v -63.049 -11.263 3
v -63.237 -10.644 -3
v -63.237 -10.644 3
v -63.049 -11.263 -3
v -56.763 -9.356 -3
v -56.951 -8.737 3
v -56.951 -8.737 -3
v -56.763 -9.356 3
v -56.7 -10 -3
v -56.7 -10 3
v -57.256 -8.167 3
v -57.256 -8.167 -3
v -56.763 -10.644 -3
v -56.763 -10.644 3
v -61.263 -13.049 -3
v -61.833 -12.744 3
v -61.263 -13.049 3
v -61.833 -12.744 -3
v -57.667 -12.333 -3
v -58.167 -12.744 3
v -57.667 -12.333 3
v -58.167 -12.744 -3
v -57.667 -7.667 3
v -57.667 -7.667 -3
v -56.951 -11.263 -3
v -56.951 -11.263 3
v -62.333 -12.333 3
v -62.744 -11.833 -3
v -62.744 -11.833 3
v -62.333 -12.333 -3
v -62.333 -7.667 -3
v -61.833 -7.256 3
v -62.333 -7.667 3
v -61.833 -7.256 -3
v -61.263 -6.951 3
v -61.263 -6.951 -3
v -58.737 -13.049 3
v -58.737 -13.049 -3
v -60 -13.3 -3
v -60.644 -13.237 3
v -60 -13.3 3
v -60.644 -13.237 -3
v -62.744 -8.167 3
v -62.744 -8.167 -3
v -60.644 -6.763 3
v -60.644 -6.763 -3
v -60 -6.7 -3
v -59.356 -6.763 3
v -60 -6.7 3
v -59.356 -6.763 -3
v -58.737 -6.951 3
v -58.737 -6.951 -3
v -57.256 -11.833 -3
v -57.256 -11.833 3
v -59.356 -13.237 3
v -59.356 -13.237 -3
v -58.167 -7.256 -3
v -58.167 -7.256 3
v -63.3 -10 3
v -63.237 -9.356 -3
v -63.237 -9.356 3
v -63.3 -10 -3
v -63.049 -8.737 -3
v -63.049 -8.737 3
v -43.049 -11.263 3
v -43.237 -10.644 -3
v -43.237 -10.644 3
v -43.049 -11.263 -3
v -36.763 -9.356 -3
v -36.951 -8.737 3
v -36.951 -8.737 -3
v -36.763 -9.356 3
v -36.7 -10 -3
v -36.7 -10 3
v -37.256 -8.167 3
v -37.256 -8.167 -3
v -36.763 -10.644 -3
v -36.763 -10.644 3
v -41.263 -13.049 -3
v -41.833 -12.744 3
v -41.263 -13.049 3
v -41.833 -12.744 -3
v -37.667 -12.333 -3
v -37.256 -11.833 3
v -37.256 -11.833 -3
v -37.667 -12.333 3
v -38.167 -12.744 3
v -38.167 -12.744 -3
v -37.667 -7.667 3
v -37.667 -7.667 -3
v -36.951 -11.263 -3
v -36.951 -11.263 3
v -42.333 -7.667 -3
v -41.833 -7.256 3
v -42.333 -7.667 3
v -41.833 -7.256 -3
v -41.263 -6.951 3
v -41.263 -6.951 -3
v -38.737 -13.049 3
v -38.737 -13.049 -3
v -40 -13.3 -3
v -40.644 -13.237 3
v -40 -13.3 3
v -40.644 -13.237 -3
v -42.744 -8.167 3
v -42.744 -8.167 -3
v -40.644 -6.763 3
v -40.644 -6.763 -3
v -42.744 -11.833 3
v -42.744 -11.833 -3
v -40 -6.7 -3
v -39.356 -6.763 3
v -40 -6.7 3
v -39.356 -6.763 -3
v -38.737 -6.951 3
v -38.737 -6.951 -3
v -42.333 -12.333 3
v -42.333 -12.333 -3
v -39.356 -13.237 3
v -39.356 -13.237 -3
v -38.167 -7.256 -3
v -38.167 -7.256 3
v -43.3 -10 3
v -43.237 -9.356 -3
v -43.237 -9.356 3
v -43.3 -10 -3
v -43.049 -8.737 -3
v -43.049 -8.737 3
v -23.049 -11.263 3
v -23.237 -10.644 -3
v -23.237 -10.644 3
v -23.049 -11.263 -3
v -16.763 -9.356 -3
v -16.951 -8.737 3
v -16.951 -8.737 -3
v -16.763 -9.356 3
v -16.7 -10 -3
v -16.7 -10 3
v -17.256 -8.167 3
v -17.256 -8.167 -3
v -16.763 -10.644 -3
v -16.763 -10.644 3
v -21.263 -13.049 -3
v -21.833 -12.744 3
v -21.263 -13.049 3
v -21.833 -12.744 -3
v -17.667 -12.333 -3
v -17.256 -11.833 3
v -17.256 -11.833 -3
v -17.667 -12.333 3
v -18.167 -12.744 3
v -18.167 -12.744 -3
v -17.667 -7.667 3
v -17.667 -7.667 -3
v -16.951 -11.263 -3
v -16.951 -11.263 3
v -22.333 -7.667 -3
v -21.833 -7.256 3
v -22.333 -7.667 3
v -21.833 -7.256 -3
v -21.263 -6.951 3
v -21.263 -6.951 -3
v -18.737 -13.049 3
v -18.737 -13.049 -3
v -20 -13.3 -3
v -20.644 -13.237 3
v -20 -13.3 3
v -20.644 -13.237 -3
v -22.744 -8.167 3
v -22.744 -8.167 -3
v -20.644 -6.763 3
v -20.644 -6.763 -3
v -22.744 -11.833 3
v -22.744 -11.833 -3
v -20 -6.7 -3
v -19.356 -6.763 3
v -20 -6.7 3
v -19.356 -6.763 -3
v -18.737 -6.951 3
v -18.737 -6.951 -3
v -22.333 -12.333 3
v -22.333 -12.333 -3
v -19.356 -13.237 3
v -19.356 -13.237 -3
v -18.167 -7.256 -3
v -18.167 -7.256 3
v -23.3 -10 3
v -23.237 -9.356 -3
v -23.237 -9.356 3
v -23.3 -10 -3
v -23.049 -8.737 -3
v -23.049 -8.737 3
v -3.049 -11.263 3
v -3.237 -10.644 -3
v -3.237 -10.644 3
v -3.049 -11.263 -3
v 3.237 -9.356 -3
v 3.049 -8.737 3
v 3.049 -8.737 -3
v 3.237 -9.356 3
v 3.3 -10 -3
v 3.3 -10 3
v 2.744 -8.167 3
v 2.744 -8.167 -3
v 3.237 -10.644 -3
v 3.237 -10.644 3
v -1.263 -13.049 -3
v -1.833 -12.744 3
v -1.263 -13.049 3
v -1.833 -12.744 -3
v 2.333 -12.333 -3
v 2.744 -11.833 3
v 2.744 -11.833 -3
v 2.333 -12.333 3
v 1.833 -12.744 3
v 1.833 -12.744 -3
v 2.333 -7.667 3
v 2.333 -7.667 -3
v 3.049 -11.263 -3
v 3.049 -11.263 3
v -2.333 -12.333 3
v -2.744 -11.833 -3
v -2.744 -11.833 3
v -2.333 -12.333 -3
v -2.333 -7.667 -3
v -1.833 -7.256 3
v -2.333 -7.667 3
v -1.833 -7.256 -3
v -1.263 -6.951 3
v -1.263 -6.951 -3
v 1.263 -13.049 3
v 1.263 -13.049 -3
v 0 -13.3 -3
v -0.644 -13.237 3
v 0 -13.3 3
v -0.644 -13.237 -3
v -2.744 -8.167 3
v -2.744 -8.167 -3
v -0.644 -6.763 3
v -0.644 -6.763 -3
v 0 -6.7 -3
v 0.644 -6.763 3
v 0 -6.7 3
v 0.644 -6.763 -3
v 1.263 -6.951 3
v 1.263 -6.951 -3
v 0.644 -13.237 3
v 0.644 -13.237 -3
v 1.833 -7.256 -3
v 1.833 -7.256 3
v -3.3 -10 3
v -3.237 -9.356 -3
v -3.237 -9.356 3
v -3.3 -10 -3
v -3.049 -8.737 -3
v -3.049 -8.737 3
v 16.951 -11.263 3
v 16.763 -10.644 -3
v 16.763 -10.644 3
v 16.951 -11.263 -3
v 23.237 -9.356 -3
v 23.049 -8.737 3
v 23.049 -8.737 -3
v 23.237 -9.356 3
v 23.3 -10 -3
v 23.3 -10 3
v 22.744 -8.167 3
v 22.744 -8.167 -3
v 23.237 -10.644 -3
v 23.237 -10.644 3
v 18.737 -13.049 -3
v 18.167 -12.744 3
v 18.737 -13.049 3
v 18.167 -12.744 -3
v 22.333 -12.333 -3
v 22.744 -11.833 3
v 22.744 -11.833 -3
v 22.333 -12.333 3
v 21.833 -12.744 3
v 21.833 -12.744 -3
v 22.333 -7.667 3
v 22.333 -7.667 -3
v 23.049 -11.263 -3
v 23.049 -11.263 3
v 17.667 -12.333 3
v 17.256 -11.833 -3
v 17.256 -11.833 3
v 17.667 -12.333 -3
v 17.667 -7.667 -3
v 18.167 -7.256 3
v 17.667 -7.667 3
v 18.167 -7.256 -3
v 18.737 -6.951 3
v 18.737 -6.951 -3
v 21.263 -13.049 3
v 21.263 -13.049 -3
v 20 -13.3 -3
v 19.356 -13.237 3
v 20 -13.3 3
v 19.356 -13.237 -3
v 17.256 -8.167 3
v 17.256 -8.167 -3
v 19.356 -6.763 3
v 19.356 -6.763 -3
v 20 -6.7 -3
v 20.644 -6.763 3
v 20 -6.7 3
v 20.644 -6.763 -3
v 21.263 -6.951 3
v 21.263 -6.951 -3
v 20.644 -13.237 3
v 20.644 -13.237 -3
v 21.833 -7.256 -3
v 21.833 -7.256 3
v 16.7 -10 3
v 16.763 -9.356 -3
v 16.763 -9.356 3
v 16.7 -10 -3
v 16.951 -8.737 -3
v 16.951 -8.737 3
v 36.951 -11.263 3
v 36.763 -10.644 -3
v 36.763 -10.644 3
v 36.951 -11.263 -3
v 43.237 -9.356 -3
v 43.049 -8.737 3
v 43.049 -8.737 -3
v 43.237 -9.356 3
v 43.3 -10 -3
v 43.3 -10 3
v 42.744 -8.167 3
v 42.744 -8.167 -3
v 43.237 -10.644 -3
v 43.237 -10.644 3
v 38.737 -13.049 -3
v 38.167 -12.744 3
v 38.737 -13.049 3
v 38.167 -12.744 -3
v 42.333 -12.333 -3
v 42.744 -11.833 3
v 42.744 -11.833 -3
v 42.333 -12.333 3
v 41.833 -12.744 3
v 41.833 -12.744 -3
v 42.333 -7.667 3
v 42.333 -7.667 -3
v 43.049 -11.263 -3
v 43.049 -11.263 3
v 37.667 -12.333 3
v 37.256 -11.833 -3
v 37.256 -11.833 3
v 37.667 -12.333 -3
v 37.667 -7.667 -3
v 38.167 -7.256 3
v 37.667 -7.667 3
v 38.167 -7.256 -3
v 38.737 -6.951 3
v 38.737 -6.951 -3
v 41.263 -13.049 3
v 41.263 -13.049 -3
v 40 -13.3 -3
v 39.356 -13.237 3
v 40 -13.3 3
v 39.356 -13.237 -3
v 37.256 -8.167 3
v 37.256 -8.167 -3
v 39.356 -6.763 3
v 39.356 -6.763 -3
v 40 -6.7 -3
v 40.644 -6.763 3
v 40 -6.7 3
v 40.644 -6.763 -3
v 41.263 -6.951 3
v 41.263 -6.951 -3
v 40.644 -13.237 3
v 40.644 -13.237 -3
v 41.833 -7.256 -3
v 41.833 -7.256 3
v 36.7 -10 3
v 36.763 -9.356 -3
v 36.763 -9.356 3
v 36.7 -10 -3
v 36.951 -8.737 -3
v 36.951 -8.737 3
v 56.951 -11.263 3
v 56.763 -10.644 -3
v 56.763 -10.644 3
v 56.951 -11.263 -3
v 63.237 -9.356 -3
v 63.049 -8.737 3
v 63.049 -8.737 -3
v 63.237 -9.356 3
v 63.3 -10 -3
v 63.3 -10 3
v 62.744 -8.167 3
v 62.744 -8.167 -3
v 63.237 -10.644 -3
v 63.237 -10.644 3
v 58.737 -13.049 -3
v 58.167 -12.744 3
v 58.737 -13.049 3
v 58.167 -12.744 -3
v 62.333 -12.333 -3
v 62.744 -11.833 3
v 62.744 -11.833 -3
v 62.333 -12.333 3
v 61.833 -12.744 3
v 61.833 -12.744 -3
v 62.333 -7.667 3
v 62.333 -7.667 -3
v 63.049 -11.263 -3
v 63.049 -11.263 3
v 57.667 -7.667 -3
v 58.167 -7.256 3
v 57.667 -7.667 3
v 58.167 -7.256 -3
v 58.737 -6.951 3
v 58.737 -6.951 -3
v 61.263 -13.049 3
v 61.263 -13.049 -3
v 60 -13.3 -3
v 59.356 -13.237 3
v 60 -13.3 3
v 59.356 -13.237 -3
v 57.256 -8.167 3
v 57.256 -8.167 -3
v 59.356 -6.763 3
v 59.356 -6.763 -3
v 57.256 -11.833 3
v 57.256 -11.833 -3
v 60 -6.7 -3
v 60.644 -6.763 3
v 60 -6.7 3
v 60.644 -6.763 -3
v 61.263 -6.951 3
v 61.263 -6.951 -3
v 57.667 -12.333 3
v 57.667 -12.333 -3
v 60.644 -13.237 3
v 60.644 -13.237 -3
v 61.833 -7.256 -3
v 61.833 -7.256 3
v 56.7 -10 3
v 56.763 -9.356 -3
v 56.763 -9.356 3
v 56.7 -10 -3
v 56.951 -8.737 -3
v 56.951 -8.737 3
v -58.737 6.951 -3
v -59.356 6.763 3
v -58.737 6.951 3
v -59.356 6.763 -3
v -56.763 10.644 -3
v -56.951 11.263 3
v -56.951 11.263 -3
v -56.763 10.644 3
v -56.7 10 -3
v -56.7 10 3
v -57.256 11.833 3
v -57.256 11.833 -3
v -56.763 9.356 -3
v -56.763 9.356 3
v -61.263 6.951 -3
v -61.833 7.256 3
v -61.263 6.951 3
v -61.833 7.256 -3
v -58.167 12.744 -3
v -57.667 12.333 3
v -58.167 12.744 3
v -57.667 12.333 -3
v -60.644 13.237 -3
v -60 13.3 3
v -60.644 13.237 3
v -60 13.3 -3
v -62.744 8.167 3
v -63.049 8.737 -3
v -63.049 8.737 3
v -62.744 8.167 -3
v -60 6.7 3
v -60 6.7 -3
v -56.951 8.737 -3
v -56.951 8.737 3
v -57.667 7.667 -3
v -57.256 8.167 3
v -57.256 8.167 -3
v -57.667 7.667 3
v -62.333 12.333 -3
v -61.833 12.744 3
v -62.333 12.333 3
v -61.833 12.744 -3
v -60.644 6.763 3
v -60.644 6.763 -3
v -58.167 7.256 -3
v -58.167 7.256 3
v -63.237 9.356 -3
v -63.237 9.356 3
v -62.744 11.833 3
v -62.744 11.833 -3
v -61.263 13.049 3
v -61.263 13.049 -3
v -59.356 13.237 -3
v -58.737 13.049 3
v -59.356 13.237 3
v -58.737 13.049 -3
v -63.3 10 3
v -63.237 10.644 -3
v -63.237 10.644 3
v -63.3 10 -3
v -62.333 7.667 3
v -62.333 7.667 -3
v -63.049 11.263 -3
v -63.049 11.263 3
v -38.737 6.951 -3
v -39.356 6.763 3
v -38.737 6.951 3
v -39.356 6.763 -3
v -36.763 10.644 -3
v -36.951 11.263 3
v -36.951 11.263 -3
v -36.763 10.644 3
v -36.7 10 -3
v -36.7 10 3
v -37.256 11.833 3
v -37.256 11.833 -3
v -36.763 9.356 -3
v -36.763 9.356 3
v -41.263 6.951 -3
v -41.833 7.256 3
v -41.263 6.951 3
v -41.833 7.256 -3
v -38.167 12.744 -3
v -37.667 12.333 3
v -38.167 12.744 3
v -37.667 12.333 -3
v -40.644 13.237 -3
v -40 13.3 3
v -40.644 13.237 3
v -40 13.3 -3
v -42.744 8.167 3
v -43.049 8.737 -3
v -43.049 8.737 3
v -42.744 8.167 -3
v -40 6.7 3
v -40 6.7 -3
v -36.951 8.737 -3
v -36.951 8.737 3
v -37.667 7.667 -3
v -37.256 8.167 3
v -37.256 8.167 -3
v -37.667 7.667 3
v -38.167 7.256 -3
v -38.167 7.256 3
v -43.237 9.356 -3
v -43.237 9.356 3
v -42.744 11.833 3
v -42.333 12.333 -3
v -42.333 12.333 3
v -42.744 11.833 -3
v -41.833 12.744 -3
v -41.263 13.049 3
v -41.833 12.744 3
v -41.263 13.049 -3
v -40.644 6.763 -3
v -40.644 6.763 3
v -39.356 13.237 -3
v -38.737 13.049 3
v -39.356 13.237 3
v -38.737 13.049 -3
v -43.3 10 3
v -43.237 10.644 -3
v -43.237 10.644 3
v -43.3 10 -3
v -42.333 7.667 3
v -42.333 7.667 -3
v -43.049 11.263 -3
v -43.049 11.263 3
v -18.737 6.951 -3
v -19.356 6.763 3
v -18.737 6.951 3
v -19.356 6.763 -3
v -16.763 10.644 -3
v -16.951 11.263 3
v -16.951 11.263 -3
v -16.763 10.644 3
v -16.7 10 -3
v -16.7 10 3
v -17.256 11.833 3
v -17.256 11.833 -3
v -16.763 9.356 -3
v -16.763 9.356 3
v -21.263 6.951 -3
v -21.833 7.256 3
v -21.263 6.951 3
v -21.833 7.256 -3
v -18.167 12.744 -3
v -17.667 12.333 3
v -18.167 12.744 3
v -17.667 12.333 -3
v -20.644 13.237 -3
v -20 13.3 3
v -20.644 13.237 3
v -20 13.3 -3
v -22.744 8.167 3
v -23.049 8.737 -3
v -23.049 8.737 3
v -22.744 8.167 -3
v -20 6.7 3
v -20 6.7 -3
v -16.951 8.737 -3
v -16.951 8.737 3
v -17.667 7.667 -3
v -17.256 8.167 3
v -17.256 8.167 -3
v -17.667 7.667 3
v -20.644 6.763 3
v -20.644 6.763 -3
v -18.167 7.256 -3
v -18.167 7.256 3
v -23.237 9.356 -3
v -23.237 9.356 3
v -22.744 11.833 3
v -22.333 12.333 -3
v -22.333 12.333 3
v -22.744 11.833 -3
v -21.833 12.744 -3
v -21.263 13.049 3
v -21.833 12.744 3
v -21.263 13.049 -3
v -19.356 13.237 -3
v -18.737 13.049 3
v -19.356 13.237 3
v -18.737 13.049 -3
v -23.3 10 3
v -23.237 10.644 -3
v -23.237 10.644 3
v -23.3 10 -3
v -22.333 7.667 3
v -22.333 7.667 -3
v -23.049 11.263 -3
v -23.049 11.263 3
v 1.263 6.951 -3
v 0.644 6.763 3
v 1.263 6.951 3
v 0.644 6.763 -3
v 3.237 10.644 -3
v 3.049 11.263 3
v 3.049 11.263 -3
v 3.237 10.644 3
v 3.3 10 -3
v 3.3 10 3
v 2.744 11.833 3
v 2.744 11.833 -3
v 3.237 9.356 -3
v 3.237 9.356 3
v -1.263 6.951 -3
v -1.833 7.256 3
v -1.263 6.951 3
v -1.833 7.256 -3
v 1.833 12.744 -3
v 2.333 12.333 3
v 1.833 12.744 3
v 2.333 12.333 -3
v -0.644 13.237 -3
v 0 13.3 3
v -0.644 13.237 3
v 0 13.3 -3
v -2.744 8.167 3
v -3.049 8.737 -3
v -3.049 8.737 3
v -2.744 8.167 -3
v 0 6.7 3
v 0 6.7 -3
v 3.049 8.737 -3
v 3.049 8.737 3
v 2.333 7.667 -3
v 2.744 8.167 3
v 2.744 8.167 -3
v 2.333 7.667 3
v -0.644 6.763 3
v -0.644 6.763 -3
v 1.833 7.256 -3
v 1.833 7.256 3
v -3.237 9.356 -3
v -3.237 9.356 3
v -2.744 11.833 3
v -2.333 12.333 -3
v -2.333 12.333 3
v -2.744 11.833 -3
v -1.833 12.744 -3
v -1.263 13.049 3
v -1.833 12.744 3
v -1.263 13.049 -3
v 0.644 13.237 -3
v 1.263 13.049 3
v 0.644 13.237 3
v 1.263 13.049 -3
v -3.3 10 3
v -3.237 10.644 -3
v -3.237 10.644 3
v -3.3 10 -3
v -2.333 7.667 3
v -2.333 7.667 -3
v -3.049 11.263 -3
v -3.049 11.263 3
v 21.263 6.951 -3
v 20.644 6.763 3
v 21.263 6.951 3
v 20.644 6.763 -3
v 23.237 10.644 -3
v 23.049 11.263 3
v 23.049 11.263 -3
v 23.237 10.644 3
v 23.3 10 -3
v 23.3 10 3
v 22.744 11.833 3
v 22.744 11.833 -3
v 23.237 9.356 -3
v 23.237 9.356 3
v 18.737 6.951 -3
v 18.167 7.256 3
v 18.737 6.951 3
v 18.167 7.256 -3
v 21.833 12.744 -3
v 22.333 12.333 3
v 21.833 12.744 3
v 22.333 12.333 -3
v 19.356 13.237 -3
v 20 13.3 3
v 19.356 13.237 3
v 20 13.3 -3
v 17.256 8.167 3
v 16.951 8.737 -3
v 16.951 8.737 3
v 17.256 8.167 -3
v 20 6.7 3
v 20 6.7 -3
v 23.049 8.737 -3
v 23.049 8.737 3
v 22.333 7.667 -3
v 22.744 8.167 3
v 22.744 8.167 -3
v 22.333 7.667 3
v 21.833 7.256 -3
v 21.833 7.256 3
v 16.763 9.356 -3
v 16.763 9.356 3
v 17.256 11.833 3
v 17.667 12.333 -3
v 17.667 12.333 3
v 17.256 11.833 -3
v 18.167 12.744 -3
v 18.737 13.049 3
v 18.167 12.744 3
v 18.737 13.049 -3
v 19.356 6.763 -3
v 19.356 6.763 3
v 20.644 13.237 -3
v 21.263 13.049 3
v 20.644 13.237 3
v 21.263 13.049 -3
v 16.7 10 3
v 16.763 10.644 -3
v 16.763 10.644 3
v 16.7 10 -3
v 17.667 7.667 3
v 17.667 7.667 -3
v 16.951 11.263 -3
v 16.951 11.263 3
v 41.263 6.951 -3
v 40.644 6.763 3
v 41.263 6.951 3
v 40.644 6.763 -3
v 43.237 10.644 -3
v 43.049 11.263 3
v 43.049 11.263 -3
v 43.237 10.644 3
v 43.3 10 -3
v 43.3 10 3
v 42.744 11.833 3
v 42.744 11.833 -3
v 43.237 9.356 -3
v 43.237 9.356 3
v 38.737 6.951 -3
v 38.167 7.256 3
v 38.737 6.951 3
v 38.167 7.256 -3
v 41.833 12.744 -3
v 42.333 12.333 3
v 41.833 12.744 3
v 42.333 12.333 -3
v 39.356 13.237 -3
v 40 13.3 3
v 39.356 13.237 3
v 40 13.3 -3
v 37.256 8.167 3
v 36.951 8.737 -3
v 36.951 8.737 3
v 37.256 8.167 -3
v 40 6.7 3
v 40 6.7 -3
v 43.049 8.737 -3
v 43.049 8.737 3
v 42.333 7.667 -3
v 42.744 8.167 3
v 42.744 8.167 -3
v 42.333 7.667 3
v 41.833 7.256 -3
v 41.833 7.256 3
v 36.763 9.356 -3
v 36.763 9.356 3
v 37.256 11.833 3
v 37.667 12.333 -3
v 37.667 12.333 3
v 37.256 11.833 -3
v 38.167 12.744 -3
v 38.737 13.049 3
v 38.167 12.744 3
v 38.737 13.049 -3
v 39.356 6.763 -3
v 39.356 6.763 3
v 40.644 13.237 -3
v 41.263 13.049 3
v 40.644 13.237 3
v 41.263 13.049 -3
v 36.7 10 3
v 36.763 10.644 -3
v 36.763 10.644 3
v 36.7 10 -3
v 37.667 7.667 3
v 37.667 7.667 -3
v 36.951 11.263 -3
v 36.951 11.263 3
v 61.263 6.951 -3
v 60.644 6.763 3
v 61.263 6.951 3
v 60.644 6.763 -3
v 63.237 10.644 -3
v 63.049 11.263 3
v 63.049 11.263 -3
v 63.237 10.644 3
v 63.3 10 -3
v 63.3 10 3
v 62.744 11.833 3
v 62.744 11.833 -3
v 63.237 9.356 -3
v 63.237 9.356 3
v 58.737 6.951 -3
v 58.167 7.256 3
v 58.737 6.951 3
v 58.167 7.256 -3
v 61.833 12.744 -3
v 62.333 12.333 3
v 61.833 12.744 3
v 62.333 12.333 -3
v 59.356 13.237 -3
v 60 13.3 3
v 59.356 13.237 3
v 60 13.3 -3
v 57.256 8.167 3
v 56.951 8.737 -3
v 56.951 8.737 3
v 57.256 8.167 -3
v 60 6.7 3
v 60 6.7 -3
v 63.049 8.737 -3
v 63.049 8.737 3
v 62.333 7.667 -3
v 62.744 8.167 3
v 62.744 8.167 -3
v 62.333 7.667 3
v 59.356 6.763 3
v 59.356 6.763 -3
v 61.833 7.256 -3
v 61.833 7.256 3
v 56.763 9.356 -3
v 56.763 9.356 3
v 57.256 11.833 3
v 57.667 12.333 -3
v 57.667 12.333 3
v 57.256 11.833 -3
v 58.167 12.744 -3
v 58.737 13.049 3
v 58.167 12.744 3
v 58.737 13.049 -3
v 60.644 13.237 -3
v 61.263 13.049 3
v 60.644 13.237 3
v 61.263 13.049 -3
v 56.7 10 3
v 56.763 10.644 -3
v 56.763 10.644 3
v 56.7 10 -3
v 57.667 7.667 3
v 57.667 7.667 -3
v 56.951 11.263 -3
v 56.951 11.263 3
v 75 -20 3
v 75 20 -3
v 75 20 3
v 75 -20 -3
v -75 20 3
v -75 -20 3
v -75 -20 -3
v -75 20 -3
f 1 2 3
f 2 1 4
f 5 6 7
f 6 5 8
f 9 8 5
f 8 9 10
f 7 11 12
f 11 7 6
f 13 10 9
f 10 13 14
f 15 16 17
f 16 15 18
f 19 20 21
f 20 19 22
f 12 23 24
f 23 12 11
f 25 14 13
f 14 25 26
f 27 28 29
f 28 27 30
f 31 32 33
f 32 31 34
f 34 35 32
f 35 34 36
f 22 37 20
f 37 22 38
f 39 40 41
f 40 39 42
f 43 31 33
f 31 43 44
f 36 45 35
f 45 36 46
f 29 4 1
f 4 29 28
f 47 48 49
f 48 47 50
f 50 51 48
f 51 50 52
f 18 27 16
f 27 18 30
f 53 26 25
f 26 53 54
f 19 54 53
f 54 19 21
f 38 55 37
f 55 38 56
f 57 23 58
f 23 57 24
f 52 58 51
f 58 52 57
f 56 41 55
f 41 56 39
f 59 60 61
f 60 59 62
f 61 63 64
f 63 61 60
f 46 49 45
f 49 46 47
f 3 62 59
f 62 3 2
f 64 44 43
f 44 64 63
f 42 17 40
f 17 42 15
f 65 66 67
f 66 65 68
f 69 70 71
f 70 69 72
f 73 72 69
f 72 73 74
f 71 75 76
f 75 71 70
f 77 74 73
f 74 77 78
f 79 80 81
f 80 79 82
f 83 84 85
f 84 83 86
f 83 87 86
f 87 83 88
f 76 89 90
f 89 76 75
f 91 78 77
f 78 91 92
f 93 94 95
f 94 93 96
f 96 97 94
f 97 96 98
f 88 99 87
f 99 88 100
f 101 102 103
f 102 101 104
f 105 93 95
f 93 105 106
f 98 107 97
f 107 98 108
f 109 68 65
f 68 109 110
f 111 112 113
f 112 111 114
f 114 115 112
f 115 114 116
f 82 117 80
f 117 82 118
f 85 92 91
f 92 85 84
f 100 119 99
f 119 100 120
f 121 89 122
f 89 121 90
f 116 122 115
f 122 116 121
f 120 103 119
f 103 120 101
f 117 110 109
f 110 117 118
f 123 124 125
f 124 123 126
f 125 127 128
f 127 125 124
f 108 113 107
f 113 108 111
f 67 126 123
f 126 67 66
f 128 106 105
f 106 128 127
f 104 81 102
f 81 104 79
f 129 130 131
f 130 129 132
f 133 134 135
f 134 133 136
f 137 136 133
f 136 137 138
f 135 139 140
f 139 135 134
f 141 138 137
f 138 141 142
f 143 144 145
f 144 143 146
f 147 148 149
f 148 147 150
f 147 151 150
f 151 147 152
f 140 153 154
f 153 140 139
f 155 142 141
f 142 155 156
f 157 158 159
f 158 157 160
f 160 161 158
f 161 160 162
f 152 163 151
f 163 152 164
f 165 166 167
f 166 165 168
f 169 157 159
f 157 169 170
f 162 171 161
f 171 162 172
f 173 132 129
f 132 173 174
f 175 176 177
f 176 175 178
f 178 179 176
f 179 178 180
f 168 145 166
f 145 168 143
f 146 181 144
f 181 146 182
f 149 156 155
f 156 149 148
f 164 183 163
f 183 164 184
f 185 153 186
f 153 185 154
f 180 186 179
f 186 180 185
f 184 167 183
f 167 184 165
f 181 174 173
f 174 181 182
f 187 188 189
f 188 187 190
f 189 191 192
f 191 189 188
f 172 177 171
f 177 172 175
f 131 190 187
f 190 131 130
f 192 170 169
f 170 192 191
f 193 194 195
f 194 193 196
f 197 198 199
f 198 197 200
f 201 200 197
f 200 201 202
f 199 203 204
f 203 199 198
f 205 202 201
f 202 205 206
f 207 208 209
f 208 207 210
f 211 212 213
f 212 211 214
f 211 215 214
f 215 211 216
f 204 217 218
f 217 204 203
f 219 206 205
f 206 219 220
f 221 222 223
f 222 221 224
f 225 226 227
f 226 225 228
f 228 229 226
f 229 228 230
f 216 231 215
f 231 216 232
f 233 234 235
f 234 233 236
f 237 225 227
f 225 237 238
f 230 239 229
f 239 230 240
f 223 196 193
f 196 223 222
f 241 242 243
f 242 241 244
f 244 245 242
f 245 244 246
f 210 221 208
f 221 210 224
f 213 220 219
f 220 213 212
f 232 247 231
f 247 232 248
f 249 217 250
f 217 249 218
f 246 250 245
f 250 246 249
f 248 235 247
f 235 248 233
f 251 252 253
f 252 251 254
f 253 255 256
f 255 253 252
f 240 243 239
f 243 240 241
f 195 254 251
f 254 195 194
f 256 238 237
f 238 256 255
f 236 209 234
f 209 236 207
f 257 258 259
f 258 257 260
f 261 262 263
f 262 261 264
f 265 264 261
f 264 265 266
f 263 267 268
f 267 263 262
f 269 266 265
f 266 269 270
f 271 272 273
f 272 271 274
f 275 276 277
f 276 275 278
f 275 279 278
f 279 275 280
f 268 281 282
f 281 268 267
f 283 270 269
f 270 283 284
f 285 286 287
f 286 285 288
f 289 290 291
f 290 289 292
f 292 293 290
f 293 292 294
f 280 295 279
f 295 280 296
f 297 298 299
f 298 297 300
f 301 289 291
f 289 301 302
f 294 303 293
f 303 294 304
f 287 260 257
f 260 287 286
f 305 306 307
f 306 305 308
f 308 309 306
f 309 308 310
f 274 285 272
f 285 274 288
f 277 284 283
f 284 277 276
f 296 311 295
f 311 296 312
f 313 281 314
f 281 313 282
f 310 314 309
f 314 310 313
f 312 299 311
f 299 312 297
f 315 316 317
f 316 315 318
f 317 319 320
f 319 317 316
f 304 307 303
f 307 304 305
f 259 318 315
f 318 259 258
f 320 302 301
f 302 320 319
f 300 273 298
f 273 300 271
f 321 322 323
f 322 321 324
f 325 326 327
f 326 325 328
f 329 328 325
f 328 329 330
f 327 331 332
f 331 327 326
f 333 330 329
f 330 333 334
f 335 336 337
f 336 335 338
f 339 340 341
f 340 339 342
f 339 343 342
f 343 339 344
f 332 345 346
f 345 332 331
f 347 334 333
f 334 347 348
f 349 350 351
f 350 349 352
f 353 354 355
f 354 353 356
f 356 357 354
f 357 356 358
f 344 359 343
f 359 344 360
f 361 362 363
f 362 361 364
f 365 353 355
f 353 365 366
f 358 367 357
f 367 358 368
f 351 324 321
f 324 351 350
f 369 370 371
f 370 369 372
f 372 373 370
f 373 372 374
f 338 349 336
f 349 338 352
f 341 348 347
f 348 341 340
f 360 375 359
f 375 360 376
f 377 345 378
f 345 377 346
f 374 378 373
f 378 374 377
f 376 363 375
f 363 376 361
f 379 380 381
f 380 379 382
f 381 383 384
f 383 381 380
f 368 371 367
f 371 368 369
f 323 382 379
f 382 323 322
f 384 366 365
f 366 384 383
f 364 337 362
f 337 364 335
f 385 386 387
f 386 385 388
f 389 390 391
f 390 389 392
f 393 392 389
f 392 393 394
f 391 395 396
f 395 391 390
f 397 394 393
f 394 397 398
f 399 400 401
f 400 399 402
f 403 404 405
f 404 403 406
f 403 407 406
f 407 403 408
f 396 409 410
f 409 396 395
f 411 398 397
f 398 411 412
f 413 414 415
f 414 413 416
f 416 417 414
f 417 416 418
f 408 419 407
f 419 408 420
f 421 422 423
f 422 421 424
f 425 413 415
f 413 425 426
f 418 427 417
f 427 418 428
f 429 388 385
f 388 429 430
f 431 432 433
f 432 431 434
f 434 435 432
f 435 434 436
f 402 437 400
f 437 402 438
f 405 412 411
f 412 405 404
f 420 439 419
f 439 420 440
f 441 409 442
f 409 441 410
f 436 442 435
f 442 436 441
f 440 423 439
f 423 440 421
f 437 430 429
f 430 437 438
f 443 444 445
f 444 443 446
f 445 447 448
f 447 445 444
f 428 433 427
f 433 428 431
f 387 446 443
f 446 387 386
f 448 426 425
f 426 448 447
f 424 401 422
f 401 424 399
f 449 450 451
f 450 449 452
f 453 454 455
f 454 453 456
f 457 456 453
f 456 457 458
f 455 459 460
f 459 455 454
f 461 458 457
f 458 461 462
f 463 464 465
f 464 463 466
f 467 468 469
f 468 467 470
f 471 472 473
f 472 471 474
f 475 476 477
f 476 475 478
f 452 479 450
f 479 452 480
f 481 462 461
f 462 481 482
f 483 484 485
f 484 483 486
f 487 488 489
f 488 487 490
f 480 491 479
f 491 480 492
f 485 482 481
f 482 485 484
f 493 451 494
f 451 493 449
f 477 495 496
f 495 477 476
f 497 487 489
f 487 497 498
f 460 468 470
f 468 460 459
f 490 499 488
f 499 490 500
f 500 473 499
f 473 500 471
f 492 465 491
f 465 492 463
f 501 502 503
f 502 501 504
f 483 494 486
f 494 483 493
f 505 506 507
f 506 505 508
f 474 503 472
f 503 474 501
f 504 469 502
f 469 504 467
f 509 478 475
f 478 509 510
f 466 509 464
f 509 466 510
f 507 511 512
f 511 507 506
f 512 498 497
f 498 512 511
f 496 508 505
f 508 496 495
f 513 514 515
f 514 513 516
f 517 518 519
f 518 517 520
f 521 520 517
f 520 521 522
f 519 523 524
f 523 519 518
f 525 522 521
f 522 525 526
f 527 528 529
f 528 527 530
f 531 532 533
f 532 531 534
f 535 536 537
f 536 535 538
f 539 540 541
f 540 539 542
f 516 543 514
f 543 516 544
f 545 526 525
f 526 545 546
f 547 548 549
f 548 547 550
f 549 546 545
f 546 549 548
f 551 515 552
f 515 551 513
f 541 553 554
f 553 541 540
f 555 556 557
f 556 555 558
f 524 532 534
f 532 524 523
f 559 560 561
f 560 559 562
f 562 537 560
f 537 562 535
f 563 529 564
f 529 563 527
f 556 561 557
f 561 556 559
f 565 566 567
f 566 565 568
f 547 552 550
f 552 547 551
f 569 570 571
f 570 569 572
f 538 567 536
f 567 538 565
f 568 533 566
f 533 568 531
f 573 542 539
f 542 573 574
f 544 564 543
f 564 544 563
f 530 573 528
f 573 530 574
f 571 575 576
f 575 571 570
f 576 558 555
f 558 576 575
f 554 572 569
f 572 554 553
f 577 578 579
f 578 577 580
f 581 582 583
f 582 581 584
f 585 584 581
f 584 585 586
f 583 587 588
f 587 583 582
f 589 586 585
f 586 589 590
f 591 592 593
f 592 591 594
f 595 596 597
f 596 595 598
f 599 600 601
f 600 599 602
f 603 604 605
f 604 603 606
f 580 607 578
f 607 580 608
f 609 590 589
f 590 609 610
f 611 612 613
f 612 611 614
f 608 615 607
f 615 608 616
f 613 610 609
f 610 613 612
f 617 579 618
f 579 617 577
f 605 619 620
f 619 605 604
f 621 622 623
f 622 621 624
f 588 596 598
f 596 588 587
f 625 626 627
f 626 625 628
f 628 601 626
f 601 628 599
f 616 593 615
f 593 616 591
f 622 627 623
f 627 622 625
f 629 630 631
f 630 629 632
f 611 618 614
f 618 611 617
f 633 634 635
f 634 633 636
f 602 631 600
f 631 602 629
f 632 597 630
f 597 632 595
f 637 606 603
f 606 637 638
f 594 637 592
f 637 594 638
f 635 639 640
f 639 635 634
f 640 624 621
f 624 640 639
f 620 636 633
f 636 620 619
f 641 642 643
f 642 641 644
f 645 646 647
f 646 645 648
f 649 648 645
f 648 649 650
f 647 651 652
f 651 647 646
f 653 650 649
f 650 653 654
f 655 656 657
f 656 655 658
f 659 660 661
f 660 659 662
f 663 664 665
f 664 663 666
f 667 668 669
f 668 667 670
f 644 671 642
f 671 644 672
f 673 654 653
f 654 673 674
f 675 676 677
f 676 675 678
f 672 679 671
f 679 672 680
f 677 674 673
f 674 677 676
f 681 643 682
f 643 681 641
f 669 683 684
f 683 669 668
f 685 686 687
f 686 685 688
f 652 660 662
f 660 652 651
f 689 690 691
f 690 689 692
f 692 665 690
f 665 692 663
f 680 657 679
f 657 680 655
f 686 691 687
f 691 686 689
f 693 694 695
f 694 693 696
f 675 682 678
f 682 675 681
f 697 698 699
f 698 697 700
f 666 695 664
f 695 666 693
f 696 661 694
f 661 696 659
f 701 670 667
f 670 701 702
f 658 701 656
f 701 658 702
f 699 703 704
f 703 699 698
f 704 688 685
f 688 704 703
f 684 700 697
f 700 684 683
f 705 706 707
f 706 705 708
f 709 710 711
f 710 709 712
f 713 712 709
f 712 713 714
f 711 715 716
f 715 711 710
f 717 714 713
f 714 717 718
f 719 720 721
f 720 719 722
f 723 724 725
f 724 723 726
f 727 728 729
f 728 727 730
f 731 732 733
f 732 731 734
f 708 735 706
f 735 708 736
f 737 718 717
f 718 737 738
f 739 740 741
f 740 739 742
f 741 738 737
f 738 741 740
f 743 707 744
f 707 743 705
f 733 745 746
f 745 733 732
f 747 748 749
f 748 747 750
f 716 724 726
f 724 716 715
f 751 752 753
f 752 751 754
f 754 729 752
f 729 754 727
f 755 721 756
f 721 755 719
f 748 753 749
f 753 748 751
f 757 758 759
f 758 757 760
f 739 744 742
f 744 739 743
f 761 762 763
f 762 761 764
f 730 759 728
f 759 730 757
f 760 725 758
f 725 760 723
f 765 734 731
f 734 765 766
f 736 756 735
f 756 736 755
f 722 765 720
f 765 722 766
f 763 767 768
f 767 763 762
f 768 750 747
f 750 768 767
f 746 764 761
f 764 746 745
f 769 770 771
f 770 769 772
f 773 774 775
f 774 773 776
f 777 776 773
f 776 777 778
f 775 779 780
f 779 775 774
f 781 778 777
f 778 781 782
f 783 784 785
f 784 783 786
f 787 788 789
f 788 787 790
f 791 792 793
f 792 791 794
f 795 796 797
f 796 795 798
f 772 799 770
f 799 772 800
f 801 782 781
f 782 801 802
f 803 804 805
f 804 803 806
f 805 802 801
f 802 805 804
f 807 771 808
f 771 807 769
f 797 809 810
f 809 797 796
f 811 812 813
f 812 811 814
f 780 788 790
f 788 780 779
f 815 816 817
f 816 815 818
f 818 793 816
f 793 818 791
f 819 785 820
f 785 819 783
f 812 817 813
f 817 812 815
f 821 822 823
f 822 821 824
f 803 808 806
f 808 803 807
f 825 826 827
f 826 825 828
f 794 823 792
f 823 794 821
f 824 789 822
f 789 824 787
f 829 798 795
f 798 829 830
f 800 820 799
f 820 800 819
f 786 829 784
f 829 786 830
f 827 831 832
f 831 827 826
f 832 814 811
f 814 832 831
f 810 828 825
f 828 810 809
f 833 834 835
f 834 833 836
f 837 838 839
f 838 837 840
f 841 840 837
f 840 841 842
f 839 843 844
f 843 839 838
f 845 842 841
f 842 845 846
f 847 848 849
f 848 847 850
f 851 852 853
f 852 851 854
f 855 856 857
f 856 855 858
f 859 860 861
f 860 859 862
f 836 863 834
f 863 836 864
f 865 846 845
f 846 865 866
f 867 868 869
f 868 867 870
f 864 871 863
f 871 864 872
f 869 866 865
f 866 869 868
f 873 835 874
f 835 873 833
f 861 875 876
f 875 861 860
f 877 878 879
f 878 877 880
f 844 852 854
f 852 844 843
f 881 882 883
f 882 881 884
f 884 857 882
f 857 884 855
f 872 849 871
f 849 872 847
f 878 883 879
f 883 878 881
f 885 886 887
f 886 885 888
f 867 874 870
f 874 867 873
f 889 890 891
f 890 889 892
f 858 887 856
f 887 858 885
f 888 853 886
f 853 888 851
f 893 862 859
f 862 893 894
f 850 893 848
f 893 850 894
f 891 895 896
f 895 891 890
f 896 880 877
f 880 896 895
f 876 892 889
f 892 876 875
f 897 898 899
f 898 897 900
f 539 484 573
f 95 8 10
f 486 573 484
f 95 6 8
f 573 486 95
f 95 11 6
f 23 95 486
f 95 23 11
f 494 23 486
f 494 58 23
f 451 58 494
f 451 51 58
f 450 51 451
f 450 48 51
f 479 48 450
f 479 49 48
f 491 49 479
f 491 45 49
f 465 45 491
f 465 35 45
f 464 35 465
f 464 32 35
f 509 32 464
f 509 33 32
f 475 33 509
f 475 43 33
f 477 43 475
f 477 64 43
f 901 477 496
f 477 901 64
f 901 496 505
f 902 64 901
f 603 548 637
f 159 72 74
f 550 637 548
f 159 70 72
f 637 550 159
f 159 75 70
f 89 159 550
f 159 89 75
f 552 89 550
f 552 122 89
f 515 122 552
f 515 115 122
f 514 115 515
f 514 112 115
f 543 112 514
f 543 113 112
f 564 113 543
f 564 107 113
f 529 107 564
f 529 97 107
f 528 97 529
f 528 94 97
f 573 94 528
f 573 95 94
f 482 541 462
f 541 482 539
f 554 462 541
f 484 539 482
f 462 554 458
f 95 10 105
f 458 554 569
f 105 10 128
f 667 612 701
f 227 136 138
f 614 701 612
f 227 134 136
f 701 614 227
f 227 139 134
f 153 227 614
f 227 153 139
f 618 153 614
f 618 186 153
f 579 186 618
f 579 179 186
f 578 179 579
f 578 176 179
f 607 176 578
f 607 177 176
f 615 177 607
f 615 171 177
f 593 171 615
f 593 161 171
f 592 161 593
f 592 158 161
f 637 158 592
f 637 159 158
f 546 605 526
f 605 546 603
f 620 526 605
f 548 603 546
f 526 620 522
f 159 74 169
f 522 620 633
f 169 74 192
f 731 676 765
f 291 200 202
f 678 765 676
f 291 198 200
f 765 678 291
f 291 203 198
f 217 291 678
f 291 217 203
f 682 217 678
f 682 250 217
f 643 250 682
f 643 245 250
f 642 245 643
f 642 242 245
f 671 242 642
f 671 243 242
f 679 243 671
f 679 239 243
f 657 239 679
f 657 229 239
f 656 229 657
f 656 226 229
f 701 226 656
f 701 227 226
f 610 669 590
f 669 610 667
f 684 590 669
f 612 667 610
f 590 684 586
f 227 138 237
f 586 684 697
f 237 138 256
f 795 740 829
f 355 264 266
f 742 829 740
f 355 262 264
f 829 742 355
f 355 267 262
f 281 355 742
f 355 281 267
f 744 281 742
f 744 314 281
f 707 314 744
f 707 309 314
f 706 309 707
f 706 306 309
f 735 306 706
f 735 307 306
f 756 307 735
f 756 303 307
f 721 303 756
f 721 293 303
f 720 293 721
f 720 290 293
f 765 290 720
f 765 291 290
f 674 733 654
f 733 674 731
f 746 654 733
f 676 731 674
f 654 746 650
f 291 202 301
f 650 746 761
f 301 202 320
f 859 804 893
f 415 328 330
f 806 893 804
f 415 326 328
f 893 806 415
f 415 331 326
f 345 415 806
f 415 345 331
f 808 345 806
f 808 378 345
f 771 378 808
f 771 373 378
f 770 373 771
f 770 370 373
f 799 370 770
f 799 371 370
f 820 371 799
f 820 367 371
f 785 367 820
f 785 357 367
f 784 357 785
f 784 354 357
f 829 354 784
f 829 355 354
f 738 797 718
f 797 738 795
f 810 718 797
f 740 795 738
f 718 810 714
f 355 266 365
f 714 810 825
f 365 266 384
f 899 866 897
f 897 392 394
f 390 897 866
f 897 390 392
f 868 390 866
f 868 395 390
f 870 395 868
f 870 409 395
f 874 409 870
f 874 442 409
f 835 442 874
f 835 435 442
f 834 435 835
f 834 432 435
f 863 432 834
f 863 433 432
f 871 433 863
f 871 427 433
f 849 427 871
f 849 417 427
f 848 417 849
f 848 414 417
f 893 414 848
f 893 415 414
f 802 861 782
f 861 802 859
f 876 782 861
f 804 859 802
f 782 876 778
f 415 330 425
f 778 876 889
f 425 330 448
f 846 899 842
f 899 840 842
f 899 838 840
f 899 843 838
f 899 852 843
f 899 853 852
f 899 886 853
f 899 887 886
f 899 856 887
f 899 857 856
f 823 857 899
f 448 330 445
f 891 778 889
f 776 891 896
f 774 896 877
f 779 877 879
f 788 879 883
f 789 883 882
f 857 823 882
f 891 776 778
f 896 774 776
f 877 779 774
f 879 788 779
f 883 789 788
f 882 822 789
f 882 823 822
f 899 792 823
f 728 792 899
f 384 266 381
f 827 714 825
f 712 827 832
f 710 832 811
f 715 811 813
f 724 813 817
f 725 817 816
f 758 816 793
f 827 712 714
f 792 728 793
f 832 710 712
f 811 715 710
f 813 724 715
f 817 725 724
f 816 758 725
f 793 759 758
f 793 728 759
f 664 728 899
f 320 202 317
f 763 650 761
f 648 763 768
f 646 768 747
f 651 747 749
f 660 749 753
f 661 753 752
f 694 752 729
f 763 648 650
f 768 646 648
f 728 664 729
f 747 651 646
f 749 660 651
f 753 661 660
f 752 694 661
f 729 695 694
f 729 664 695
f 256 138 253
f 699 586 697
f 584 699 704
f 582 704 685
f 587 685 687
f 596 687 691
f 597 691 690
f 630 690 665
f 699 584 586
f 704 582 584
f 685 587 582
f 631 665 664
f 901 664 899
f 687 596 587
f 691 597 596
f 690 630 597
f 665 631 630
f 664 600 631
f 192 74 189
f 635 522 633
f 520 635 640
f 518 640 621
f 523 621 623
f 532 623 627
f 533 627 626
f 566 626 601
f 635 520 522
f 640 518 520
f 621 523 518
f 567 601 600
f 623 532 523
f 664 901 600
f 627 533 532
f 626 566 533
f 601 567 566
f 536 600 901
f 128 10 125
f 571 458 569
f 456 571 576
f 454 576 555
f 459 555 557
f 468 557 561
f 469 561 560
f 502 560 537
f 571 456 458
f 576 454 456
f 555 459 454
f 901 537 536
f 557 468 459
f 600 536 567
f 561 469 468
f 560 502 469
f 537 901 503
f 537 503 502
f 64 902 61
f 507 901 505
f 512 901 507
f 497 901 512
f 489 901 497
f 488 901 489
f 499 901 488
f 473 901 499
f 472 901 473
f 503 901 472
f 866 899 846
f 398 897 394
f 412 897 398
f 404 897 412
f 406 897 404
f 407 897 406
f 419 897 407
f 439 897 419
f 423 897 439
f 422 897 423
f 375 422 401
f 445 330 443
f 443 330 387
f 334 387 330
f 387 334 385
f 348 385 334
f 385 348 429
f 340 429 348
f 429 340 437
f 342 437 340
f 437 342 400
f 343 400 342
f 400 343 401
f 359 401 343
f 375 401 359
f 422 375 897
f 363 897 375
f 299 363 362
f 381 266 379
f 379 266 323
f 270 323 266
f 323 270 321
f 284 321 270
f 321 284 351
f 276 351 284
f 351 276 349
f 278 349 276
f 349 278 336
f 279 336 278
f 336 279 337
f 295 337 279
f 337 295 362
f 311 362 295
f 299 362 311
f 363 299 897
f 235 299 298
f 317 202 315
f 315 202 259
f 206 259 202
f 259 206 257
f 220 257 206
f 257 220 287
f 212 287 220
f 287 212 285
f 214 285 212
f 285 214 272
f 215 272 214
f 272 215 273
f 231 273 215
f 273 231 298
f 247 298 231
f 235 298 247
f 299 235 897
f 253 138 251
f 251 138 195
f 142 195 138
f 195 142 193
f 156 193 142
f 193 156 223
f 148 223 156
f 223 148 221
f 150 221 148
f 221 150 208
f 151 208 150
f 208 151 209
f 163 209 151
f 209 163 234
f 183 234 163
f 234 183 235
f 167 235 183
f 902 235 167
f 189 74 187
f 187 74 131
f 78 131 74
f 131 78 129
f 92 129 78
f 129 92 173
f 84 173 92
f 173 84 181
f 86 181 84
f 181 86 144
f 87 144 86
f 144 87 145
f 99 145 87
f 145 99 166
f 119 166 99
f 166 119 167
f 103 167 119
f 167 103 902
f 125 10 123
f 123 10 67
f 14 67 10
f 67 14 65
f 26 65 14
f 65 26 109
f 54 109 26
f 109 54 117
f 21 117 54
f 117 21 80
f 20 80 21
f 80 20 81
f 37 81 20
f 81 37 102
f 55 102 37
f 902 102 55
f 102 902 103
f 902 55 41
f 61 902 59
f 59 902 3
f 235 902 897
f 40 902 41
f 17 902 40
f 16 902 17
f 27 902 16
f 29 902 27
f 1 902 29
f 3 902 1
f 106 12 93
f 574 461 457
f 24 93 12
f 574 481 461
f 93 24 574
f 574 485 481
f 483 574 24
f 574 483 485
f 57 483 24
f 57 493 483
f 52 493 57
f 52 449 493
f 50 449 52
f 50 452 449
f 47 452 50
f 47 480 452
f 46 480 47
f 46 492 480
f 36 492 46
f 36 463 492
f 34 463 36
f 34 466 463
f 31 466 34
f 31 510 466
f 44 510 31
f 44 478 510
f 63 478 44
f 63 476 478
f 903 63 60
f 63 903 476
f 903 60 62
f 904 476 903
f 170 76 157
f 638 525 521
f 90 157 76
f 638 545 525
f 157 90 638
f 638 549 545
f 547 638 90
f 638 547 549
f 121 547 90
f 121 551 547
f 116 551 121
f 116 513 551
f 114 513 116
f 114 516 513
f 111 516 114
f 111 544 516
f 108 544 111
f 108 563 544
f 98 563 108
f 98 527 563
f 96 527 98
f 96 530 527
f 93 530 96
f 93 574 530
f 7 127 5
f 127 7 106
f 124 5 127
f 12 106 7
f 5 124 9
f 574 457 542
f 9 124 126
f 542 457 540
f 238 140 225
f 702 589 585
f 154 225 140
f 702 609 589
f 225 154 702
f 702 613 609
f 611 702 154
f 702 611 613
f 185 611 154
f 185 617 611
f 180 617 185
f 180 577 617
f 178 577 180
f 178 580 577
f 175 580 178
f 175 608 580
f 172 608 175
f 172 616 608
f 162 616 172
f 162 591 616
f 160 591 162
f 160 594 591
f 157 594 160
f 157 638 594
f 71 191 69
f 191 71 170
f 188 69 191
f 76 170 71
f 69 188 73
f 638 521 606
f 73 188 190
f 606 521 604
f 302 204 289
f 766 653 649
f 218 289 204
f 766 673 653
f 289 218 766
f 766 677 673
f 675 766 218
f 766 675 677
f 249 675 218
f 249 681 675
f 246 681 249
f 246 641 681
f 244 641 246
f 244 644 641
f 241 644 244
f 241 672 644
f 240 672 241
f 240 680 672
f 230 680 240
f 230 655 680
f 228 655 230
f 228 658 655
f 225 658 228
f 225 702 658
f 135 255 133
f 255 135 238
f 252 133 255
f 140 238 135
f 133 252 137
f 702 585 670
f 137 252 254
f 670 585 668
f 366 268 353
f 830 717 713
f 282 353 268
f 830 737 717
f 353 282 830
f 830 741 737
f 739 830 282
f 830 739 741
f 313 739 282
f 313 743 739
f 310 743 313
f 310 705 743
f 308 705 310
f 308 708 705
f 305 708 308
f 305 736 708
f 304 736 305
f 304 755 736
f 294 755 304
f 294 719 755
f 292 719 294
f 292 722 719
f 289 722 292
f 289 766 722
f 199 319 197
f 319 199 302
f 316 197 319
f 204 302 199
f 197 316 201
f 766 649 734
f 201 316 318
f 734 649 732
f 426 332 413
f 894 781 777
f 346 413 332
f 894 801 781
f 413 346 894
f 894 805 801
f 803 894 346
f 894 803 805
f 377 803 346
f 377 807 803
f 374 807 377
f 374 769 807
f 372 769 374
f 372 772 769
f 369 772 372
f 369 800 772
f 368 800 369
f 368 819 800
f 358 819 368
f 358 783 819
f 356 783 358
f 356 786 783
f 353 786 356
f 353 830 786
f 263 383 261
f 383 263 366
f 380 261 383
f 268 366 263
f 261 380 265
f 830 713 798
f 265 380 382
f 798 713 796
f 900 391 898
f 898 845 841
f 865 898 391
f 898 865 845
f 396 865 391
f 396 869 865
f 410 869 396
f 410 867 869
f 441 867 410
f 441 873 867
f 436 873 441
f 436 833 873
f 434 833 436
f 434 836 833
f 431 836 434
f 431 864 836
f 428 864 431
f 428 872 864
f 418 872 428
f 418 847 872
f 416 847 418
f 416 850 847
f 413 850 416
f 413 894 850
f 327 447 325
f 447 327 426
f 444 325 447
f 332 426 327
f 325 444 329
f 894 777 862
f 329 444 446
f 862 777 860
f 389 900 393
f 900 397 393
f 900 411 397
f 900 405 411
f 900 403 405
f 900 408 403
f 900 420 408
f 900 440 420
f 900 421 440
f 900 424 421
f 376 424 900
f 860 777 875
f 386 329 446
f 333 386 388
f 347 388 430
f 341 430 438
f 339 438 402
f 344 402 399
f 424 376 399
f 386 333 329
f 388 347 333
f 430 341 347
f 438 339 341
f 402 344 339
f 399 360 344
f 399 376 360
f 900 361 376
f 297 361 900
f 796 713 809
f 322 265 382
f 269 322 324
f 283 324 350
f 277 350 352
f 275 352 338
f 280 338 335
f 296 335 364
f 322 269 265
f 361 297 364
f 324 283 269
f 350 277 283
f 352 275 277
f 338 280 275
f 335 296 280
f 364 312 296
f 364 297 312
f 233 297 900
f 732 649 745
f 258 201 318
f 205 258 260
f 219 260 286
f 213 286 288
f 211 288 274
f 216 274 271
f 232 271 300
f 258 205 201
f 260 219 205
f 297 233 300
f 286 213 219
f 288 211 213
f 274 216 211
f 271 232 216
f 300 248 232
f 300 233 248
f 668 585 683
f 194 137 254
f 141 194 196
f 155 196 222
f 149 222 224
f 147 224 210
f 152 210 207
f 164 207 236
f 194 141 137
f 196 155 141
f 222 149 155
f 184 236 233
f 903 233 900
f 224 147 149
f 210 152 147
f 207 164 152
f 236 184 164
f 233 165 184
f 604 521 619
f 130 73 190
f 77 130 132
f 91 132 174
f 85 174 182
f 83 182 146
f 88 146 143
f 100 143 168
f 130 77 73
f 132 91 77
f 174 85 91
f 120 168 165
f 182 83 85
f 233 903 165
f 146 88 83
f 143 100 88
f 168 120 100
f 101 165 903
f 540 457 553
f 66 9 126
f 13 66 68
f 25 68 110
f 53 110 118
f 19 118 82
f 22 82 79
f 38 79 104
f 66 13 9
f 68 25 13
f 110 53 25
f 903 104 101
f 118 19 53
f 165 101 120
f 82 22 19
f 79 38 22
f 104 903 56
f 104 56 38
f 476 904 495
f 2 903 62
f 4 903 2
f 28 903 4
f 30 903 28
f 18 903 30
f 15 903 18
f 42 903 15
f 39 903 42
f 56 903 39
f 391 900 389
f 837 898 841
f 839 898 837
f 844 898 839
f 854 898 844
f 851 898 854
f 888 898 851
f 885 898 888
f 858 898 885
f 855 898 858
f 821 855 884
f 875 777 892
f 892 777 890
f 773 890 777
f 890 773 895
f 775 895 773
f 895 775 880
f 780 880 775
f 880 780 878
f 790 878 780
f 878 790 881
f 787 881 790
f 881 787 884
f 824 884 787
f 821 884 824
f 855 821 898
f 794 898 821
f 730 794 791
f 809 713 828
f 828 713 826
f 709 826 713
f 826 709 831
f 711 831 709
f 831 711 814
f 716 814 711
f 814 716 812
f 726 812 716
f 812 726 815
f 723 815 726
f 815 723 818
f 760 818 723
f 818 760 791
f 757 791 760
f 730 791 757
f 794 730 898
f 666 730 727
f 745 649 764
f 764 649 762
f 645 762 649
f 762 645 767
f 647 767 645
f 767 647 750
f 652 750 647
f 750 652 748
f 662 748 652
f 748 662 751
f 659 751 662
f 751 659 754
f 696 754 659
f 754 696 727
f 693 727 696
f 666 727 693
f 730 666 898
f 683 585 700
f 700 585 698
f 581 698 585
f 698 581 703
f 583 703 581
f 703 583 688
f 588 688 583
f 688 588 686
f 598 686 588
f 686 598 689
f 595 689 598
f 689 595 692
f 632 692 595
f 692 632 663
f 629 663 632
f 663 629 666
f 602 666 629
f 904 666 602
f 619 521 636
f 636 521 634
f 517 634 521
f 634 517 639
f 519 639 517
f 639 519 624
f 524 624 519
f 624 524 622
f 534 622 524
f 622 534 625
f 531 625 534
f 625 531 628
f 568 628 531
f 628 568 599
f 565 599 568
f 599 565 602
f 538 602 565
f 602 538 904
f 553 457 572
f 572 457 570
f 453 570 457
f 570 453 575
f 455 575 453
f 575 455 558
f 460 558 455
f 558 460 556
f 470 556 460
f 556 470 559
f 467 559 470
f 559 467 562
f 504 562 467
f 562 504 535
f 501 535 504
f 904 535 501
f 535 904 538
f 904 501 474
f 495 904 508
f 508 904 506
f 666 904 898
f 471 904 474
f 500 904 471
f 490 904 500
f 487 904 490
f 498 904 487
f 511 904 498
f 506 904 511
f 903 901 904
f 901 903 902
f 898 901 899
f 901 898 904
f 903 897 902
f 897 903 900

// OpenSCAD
$fn = 32;

// ----------------------------------------------------------------------
// Hole bar, 7 x Ø6.6
// tworows layout, 15 mm edge offset
// ----------------------------------------------------------------------

// --- parameters (mm) ---
bar_w = 40;       // bar width (Y)
bar_t = 6;        // bar thickness (Z)
holes = 7;        // holes per row
hole_d = 6.6;     // hole diameter
edge = 15;        // offset from the bar end to the first hole
pitch = 20;       // pitch between neighbouring holes
row_offset = 20;  // distance between the two rows

// --- derived feature positions (mm) ---
span = (holes - 1) * pitch;   // = 120   distance between the end holes
bar_l = span + 2 * edge;      // = 150   overall bar length
start_x = -bar_l / 2 + edge;  // = -60   X of the first hole
feature_centers = [
  [start_x + 0 * pitch, -row_offset / 2],
  [start_x + 1 * pitch, -row_offset / 2],
  [start_x + 2 * pitch, -row_offset / 2],
  [start_x + 3 * pitch, -row_offset / 2],
  [start_x + 4 * pitch, -row_offset / 2],
  [start_x + 5 * pitch, -row_offset / 2],
  [start_x + 6 * pitch, -row_offset / 2]
];   // hole centres of the first row
row2_centers = [
  [start_x + 0 * pitch, row_offset / 2],
  [start_x + 1 * pitch, row_offset / 2],
  [start_x + 2 * pitch, row_offset / 2],
  [start_x + 3 * pitch, row_offset / 2],
  [start_x + 4 * pitch, row_offset / 2],
  [start_x + 5 * pitch, row_offset / 2],
  [start_x + 6 * pitch, row_offset / 2]
];   // hole centres of the second row

// bar with two rows of holes, both read from their own centre arrays
difference() {
  translate([-bar_l / 2, -bar_w / 2, -bar_t / 2]) cube([bar_l, bar_w, bar_t]);
  for (centre = feature_centers)
    translate([centre[0], centre[1], 0])
      cylinder(d = hole_d, h = bar_t + 2, center = true);
  for (centre = row2_centers)
    translate([centre[0], centre[1], 0])
      cylinder(d = hole_d, h = bar_t + 2, center = true);
}
